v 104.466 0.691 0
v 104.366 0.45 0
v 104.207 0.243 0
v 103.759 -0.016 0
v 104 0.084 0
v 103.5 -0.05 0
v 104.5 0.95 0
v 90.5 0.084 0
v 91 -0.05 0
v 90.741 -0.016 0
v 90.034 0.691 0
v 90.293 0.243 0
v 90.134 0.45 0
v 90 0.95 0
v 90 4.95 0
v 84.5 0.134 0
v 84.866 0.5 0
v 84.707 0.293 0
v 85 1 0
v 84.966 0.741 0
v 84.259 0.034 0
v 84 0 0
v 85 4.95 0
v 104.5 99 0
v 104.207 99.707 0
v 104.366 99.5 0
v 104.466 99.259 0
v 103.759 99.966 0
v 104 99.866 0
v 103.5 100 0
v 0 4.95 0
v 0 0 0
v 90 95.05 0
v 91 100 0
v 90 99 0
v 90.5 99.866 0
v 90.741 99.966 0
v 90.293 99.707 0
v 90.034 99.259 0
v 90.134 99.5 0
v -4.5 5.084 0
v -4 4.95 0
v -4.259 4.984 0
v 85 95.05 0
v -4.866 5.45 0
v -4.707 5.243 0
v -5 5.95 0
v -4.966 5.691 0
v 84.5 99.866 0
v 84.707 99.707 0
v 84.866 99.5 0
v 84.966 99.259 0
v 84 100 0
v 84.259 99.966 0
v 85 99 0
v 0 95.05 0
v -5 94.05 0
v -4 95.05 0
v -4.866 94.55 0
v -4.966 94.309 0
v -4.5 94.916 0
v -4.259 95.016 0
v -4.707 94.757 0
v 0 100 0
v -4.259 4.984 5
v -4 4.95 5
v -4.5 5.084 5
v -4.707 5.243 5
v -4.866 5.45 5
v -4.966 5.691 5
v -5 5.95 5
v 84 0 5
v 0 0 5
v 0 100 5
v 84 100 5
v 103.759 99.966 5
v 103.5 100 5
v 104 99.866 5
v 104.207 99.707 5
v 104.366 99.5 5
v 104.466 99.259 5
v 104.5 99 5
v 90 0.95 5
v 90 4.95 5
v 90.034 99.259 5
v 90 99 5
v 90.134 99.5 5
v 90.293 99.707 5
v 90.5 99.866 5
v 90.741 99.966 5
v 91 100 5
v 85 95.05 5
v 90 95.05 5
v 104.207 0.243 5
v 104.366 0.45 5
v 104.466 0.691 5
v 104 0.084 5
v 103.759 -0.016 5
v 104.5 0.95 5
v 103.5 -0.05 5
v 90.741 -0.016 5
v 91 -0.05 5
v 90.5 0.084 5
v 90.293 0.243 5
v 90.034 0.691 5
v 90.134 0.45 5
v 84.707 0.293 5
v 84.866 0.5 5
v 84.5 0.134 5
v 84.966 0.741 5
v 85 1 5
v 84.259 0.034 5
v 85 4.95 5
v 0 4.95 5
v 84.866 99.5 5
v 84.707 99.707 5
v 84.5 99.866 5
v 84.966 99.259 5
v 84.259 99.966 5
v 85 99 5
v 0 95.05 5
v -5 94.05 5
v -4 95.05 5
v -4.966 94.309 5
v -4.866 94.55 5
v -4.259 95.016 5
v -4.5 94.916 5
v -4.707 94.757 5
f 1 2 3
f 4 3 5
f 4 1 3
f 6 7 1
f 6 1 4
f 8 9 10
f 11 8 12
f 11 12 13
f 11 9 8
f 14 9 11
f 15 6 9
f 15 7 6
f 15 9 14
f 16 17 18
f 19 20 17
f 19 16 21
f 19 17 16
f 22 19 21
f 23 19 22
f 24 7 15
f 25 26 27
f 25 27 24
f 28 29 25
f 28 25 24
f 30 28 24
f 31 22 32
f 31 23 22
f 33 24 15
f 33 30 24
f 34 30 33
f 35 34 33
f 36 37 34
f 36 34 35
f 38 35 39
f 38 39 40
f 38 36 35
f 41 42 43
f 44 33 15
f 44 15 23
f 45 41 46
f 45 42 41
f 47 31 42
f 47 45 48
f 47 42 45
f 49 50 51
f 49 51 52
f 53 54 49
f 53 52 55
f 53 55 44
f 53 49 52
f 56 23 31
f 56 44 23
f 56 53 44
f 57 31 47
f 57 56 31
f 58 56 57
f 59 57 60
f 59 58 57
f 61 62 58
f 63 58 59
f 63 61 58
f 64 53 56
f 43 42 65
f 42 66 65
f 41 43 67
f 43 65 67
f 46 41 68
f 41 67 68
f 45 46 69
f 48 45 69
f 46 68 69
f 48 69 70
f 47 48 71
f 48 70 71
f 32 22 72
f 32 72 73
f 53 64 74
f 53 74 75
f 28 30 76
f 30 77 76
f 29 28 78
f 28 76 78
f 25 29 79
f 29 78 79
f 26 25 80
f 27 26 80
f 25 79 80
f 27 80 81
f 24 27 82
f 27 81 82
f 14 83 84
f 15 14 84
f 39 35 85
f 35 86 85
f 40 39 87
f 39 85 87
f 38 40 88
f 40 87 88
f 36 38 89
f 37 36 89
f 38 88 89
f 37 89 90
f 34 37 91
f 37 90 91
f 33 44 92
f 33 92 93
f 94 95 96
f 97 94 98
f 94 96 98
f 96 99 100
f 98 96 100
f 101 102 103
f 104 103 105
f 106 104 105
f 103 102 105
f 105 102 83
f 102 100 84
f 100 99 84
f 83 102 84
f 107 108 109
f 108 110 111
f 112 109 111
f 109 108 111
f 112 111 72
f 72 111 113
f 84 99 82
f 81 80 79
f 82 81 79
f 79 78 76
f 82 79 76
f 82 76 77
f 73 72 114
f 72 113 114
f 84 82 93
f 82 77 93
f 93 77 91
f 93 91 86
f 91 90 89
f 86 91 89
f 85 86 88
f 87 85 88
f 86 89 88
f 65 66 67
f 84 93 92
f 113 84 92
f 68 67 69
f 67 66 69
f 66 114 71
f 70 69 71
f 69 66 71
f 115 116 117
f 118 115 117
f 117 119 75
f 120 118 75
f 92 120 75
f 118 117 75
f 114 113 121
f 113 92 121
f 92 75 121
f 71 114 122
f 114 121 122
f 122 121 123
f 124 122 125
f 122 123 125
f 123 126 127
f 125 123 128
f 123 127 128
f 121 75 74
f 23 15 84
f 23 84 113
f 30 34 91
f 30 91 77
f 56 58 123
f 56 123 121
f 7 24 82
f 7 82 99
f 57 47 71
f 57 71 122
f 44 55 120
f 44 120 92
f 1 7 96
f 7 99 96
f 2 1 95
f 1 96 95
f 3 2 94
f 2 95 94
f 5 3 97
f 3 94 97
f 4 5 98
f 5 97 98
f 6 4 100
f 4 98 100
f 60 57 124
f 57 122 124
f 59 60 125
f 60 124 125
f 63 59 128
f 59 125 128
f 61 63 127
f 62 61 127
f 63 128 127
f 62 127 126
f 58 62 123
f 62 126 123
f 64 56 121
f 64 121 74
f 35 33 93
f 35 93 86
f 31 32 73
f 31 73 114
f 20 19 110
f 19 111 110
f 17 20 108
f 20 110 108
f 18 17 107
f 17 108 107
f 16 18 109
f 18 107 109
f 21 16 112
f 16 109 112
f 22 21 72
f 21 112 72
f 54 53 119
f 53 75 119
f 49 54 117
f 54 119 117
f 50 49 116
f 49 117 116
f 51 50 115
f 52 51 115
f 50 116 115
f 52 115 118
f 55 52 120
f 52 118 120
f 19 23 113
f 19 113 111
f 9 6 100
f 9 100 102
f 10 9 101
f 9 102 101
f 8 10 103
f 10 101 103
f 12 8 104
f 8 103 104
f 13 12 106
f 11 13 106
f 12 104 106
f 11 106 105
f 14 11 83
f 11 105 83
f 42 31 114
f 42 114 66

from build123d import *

# Parameters (mm, degrees)
BOSS_EXTRUDE1_DEPTH = 5
FILLET1_R           = 1


with BuildPart() as part:
    # Sketch1 → Boss-Extrude1 (new body)
    with BuildSketch(Plane.XY):
        Polygon((0, 95.05), (0, 100), (85, 100), (85, 95.05), (90, 95.05), (90, 100), (104.5, 100), (104.5, -0.05), (90, -0.05), (90, 4.95), (85, 4.95), (85, 0), (0, 0), (0, 4.95), (-5, 4.95), (-5, 95.05), align=None)
    extrude(amount=BOSS_EXTRUDE1_DEPTH)

    # Fillet1
    fillet1_edges = [part.edges().sort_by_distance(p)[0] for p in [
        (-5, 4.95, 2.5),
        (-5, 95.05, 2.5),
        (85, 100, 2.5),
        (90, 100, 2.5),
        (104.5, 100, 2.5),
        (104.5, -0.05, 2.5),
        (90, -0.05, 2.5),
        (85, 0, 2.5),
    ]]
    fillet(fillet1_edges, radius=FILLET1_R)


solid = part.part
